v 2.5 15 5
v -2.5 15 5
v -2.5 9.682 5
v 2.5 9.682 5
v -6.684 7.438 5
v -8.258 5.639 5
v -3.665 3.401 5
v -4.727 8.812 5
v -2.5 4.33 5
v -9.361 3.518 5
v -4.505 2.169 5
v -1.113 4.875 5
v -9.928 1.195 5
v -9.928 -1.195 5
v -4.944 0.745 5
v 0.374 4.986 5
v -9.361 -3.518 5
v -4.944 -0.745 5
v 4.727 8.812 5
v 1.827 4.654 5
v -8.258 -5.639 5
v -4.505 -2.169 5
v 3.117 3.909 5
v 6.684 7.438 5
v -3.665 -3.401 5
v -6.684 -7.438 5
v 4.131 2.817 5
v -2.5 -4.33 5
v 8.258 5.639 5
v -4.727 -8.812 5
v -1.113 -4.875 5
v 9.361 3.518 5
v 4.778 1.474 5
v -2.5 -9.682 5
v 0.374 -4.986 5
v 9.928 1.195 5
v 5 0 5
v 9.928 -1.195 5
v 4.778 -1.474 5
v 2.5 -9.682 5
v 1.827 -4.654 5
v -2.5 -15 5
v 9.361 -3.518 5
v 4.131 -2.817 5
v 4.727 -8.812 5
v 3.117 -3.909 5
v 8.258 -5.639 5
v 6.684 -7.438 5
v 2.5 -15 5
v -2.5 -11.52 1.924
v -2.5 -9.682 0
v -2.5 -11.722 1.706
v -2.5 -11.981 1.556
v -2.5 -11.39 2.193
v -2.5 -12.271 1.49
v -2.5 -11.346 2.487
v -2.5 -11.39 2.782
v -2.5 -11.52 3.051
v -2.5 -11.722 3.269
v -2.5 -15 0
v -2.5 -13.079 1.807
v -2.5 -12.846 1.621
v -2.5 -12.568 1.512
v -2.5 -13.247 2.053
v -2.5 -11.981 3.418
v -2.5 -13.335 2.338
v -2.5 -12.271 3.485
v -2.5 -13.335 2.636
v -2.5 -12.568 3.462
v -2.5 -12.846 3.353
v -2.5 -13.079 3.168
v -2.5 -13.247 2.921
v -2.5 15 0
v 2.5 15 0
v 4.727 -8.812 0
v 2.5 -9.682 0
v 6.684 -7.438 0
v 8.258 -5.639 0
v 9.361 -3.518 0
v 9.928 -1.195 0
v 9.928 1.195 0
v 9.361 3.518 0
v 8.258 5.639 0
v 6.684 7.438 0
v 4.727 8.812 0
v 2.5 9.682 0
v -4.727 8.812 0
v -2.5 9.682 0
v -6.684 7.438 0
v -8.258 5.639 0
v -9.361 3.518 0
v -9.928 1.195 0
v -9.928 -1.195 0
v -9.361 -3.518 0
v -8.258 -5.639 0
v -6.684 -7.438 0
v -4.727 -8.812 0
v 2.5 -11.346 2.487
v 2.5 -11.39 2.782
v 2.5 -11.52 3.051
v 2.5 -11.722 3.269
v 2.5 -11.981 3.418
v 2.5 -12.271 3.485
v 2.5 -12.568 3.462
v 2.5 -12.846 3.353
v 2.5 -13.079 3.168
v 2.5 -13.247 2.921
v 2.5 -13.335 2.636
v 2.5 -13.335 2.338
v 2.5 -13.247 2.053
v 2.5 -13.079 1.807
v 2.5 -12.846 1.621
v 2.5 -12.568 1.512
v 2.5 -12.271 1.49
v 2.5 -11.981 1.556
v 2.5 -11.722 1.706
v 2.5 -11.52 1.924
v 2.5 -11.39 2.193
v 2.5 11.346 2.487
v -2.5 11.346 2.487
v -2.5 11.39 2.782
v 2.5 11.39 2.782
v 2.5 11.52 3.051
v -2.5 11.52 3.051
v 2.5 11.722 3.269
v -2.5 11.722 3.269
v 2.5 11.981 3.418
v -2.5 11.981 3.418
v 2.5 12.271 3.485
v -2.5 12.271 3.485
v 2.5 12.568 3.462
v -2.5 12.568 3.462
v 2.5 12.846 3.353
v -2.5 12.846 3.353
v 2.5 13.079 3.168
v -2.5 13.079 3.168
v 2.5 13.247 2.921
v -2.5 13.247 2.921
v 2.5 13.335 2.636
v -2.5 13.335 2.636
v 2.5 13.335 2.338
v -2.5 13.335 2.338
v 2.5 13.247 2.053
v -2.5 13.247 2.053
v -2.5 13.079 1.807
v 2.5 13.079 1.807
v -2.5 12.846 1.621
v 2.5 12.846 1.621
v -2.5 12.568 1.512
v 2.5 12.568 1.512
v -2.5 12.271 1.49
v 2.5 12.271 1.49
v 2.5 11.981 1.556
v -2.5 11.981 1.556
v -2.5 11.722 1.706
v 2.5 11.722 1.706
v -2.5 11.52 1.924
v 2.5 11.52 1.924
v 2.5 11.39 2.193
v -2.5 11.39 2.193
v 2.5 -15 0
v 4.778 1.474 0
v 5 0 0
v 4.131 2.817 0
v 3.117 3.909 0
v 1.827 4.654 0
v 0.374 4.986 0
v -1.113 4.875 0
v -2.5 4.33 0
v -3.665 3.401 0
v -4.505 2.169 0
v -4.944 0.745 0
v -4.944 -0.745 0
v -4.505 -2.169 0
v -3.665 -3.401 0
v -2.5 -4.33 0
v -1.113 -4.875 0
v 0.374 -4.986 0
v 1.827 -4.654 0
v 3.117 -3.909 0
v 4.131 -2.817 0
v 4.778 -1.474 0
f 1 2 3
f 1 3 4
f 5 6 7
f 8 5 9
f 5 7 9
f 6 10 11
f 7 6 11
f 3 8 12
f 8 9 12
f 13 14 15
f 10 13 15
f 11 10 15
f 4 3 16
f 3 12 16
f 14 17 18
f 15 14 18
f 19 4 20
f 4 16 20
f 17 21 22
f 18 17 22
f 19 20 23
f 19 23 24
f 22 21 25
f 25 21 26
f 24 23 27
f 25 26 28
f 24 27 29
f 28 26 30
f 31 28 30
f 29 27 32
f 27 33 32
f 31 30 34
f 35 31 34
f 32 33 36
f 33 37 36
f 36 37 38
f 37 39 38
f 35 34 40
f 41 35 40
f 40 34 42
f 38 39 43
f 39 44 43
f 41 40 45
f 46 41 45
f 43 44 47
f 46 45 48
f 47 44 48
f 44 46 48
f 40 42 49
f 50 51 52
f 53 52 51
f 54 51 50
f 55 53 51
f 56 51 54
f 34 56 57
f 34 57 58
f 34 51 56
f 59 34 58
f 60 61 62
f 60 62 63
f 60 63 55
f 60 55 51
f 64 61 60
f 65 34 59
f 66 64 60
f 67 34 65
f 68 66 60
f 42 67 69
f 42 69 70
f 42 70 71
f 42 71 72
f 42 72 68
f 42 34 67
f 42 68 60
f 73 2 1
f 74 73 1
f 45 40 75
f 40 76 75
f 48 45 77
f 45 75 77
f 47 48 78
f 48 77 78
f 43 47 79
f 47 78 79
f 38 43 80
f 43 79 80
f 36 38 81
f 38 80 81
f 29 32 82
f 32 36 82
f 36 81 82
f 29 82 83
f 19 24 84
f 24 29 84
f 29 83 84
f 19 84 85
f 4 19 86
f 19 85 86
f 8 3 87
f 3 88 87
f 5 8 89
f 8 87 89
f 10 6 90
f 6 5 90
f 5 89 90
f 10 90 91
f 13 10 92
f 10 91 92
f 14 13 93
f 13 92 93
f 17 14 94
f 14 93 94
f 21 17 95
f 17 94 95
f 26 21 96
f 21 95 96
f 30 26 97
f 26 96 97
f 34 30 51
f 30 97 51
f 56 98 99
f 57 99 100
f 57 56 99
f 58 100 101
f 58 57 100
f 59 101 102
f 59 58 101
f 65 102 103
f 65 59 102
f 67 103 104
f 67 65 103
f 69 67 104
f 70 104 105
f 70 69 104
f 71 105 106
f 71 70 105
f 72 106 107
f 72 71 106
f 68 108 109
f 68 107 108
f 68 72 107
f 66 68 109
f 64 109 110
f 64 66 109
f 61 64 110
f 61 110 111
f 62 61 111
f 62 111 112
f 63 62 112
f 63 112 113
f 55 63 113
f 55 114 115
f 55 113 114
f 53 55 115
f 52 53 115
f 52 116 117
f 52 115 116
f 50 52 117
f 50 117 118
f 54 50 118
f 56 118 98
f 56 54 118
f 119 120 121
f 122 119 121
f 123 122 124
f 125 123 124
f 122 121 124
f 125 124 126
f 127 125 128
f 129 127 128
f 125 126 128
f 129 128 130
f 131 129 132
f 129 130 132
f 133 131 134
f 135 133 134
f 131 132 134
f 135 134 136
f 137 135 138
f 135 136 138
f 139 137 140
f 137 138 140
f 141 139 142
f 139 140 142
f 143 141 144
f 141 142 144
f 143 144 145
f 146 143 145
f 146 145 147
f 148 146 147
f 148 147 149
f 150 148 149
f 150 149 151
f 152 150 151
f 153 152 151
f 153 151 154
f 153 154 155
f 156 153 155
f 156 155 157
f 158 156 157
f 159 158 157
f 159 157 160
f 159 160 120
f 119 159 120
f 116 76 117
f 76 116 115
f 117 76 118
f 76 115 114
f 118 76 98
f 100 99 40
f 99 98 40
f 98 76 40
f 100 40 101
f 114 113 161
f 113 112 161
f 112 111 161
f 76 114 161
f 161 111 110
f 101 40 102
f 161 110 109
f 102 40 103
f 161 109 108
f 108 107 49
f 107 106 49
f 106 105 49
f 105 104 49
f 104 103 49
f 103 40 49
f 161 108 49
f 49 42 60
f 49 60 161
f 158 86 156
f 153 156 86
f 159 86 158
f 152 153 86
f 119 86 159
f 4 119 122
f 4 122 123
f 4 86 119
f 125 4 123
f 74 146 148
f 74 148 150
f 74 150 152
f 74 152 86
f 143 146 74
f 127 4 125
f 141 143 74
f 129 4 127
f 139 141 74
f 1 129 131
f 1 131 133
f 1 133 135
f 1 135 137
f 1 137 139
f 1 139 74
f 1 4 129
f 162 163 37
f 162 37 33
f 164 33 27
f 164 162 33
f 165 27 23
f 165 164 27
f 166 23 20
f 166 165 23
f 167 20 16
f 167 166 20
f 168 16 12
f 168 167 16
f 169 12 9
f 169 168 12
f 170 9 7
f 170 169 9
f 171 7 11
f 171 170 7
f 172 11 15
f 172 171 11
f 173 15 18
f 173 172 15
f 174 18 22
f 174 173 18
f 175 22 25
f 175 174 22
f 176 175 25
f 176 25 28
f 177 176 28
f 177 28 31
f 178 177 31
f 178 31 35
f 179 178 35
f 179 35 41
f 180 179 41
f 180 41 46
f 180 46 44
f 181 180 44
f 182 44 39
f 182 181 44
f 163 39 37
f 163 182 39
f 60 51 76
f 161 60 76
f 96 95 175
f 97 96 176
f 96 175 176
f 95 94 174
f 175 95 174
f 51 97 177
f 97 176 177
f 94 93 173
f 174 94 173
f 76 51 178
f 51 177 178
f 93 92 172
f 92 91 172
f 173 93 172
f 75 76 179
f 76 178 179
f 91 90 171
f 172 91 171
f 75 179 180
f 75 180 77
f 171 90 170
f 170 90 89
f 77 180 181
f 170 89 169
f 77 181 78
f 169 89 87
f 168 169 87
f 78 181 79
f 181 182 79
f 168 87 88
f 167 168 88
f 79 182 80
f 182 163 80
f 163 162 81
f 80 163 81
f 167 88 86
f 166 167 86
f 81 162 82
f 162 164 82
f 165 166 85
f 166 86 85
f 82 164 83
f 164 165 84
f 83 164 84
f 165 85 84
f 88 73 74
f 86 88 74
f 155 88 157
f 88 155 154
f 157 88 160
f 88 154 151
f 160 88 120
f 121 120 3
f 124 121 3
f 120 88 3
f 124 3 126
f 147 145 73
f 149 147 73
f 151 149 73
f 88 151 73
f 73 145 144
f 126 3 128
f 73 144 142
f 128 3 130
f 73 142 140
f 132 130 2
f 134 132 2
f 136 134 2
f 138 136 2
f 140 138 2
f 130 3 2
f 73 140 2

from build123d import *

# Parameters (mm, degrees)
ESQUISSE1_R             = 10
ESQUISSE1_R_2           = 5
BOSS_EXTRU_1_DEPTH      = 5
ESQUISSE2_W             = 5
ESQUISSE2_H             = 7
BOSS_EXTRU_2_DEPTH      = 5
ESQUISSE3_R             = 1
ENL_V_MAT_EXTRU_1_DEPTH = 10


with BuildPart() as part:
    # Esquisse1 → Boss.-Extru.1 (new body)
    with BuildSketch(Plane.XY):
        Circle(ESQUISSE1_R)
        Circle(ESQUISSE1_R_2, mode=Mode.SUBTRACT)
    extrude(amount=BOSS_EXTRU_1_DEPTH)

    # Esquisse2 → Boss.-Extru.2 (add)
    with BuildSketch(Plane.XY.offset(5)):
        with Locations((0, 11.5)):
            Rectangle(ESQUISSE2_W, ESQUISSE2_H)
    boss_extru_2 = extrude(amount=-BOSS_EXTRU_2_DEPTH)

    # Esquisse3 → Enlèv. mat.-Extru.1 (cut)
    with BuildSketch(Plane(origin=(-2.5, 0, 0), x_dir=(0, -1, 0), z_dir=(-1, 0, 0))):
        with Locations((-12.345891544, 2.487364075)):
            Circle(ESQUISSE3_R)
    enl_v_mat_extru_1 = extrude(amount=-ENL_V_MAT_EXTRU_1_DEPTH, mode=Mode.SUBTRACT)

    # Symétrie1: Boss.-Extru.2, Enlèv. mat.-Extru.1 across plane
    add(boss_extru_2.mirror(Plane.ZX))
    add(enl_v_mat_extru_1.mirror(Plane.ZX), mode=Mode.SUBTRACT)


solid = part.part
